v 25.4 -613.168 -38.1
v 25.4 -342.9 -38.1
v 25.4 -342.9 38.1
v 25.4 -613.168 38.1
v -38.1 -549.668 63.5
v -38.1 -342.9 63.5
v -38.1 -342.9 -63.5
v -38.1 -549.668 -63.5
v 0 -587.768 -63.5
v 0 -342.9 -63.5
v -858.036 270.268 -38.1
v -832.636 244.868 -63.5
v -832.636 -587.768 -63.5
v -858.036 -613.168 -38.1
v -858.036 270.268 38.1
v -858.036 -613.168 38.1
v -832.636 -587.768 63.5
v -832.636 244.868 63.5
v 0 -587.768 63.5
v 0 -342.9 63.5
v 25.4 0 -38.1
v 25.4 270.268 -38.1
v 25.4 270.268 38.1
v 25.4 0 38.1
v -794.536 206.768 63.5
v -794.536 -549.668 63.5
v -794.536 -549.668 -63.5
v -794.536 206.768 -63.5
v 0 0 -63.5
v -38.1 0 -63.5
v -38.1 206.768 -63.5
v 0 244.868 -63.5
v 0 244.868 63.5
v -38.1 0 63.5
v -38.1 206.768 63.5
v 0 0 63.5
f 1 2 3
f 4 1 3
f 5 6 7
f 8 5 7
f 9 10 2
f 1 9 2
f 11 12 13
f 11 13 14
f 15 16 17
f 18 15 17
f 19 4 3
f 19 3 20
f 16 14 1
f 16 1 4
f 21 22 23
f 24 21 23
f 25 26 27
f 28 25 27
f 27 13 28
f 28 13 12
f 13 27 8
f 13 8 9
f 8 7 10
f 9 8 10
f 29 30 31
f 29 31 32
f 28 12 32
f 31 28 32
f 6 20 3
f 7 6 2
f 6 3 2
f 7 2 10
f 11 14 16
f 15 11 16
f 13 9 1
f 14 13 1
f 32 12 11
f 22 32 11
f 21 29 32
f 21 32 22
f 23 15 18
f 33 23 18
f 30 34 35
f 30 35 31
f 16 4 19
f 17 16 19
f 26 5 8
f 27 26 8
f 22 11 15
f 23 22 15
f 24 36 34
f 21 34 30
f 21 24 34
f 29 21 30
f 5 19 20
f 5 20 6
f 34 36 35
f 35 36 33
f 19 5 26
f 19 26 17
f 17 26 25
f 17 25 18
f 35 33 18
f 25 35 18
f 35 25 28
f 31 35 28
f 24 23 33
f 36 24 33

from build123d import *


with BuildPart() as f2:
    # F2: sweep along a path in F1
    with BuildLine(Plane.XY) as f2_path:
        Line((-41.6680008888, 0), (-41.6680008888, 203.2))
        Line((-41.6680008888, 203.2), (-790.9680008888, 203.2))
        Line((-790.9680008888, 203.2), (-790.9680008888, -546.1))
        Line((-790.9680008888, -546.1), (-41.6680008888, -546.1))
        Line((-41.6680008888, -546.1), (-41.6680008888, -342.9))
    # F0 (on Front) → F2 (sweep)
    with BuildSketch(Plane.XZ):
        Polygon((0, 63.5), (-38.1, 63.5), (-38.1, 0), (-38.1, -63.5), (0, -63.5), (25.4, -38.1), (25.4, 0), (25.4, 38.1), align=None)
    sweep(path=f2_path.line, transition=Transition.RIGHT)


solid = f2.part
